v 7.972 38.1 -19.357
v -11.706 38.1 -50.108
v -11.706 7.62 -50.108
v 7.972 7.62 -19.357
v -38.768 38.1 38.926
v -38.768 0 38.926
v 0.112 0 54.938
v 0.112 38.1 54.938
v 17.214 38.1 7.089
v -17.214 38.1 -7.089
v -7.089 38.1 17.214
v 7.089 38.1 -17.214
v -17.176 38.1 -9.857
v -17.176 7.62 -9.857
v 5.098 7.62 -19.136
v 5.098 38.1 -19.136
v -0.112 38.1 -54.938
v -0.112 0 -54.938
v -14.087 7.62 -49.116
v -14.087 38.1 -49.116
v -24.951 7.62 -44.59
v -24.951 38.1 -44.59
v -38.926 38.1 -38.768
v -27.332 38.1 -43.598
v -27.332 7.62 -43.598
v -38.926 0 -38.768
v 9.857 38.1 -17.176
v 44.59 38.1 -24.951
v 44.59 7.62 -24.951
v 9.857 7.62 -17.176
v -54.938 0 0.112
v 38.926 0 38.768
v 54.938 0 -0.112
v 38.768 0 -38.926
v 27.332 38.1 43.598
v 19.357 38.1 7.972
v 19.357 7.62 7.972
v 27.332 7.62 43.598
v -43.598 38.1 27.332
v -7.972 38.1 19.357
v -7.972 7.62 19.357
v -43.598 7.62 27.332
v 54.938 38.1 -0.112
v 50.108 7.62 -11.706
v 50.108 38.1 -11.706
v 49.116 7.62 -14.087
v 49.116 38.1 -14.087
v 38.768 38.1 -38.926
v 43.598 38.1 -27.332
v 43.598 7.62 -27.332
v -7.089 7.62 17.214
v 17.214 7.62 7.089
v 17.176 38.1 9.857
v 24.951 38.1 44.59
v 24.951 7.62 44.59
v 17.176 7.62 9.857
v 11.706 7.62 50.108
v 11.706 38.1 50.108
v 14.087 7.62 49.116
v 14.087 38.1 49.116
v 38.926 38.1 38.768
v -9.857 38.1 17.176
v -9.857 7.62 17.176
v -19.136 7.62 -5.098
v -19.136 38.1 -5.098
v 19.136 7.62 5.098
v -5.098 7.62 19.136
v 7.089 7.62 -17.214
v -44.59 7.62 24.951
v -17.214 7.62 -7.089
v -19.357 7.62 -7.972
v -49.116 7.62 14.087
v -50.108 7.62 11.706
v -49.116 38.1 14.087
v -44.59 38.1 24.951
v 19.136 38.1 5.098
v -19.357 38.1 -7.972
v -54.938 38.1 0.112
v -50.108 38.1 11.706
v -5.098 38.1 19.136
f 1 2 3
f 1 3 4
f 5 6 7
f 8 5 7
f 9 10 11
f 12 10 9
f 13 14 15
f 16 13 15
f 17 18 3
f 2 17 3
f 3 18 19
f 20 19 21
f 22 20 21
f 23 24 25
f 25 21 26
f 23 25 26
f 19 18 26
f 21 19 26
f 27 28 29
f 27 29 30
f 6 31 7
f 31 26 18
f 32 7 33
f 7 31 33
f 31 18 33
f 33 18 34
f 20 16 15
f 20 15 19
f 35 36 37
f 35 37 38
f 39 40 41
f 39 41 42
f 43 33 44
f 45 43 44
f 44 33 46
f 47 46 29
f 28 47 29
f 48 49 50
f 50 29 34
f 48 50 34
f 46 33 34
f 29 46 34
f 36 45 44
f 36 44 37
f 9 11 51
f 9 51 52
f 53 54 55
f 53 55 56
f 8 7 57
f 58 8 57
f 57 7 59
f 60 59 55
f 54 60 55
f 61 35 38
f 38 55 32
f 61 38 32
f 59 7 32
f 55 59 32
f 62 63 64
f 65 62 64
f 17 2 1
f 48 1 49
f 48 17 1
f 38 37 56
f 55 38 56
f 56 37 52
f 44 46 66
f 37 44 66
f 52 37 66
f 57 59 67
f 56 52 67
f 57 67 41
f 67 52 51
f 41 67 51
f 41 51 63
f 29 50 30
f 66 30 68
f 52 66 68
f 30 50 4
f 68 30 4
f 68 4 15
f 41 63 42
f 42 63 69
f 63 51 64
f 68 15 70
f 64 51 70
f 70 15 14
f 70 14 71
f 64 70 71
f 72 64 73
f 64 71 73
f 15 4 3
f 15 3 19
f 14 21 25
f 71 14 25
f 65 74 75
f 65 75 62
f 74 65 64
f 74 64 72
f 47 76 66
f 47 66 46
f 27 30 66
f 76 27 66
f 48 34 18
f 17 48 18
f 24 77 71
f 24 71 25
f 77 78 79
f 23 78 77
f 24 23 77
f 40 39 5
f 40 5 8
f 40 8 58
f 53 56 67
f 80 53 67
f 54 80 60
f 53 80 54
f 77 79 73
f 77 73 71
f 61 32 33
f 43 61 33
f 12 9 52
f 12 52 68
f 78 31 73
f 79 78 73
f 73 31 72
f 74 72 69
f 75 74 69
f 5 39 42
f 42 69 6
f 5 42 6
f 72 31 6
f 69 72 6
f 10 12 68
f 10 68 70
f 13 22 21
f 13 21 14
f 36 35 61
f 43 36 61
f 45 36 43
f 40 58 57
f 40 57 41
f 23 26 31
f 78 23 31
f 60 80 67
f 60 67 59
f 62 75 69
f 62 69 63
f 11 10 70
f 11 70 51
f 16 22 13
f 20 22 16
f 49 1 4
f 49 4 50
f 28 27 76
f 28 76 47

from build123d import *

# Parameters (mm, degrees)
BOSS_EXTRUDE1_DEPTH     = 38.1
CUT_EXTRUDE_THIN1_DEPTH = 30.48


with BuildPart() as part:
    # Sketch1 → Boss-Extrude1 (new body)
    with BuildSketch(Plane(origin=(0, 0, 0), x_dir=(1, 0, 0), z_dir=(0, 1, 0))):
        Polygon((-0.111992667, 54.937923296), (-38.926168882, 38.767787333), (-54.937923296, -0.111992667), (-38.767787333, -38.926168882), (0.111992667, -54.937923296), (38.926168882, -38.767787333), (54.937923296, 0.111992667), (38.767787333, 38.926168882), align=None)
    extrude(amount=BOSS_EXTRUDE1_DEPTH)

    # Sketch2 → Cut-Extrude-Thin1 (cut)
    with BuildSketch(Plane(origin=(0, 38.1, 0), x_dir=(1, 0, 0), z_dir=(0, 1, 0))):
        Polygon((24.950943415, -44.589920325), (17.176445042, -9.856652985), (-5.097897691, -19.136230336), (14.087218134, -49.115790304), (11.947790374, -50.484895435), (-8.86896141, -17.955664748), (18.993913528, -6.347883261), (27.429609427, -44.035109726), align=None)
        Polygon((-44.589920325, -24.950943415), (-9.856652985, -17.176445042), (-19.136230336, 5.097897691), (-49.115790304, -14.087218134), (-50.484895435, -11.947790374), (-17.955664748, 8.86896141), (-6.347883261, -18.993913528), (-44.035109726, -27.429609427), align=None)
        Polygon((-24.950943415, 44.589920325), (-17.176445042, 9.856652985), (5.097897691, 19.136230336), (-14.087218134, 49.115790304), (-11.947790374, 50.484895435), (8.86896141, 17.955664748), (-18.993913528, 6.347883261), (-27.429609427, 44.035109726), align=None)
        Polygon((44.589920325, 24.950943415), (9.856652985, 17.176445042), (19.136230336, -5.097897691), (49.115790304, 14.087218134), (50.484895435, 11.947790374), (17.955664748, -8.86896141), (6.347883261, 18.993913528), (44.035109726, 27.429609427), align=None)
    extrude(amount=-CUT_EXTRUDE_THIN1_DEPTH, mode=Mode.SUBTRACT)


solid = part.part
